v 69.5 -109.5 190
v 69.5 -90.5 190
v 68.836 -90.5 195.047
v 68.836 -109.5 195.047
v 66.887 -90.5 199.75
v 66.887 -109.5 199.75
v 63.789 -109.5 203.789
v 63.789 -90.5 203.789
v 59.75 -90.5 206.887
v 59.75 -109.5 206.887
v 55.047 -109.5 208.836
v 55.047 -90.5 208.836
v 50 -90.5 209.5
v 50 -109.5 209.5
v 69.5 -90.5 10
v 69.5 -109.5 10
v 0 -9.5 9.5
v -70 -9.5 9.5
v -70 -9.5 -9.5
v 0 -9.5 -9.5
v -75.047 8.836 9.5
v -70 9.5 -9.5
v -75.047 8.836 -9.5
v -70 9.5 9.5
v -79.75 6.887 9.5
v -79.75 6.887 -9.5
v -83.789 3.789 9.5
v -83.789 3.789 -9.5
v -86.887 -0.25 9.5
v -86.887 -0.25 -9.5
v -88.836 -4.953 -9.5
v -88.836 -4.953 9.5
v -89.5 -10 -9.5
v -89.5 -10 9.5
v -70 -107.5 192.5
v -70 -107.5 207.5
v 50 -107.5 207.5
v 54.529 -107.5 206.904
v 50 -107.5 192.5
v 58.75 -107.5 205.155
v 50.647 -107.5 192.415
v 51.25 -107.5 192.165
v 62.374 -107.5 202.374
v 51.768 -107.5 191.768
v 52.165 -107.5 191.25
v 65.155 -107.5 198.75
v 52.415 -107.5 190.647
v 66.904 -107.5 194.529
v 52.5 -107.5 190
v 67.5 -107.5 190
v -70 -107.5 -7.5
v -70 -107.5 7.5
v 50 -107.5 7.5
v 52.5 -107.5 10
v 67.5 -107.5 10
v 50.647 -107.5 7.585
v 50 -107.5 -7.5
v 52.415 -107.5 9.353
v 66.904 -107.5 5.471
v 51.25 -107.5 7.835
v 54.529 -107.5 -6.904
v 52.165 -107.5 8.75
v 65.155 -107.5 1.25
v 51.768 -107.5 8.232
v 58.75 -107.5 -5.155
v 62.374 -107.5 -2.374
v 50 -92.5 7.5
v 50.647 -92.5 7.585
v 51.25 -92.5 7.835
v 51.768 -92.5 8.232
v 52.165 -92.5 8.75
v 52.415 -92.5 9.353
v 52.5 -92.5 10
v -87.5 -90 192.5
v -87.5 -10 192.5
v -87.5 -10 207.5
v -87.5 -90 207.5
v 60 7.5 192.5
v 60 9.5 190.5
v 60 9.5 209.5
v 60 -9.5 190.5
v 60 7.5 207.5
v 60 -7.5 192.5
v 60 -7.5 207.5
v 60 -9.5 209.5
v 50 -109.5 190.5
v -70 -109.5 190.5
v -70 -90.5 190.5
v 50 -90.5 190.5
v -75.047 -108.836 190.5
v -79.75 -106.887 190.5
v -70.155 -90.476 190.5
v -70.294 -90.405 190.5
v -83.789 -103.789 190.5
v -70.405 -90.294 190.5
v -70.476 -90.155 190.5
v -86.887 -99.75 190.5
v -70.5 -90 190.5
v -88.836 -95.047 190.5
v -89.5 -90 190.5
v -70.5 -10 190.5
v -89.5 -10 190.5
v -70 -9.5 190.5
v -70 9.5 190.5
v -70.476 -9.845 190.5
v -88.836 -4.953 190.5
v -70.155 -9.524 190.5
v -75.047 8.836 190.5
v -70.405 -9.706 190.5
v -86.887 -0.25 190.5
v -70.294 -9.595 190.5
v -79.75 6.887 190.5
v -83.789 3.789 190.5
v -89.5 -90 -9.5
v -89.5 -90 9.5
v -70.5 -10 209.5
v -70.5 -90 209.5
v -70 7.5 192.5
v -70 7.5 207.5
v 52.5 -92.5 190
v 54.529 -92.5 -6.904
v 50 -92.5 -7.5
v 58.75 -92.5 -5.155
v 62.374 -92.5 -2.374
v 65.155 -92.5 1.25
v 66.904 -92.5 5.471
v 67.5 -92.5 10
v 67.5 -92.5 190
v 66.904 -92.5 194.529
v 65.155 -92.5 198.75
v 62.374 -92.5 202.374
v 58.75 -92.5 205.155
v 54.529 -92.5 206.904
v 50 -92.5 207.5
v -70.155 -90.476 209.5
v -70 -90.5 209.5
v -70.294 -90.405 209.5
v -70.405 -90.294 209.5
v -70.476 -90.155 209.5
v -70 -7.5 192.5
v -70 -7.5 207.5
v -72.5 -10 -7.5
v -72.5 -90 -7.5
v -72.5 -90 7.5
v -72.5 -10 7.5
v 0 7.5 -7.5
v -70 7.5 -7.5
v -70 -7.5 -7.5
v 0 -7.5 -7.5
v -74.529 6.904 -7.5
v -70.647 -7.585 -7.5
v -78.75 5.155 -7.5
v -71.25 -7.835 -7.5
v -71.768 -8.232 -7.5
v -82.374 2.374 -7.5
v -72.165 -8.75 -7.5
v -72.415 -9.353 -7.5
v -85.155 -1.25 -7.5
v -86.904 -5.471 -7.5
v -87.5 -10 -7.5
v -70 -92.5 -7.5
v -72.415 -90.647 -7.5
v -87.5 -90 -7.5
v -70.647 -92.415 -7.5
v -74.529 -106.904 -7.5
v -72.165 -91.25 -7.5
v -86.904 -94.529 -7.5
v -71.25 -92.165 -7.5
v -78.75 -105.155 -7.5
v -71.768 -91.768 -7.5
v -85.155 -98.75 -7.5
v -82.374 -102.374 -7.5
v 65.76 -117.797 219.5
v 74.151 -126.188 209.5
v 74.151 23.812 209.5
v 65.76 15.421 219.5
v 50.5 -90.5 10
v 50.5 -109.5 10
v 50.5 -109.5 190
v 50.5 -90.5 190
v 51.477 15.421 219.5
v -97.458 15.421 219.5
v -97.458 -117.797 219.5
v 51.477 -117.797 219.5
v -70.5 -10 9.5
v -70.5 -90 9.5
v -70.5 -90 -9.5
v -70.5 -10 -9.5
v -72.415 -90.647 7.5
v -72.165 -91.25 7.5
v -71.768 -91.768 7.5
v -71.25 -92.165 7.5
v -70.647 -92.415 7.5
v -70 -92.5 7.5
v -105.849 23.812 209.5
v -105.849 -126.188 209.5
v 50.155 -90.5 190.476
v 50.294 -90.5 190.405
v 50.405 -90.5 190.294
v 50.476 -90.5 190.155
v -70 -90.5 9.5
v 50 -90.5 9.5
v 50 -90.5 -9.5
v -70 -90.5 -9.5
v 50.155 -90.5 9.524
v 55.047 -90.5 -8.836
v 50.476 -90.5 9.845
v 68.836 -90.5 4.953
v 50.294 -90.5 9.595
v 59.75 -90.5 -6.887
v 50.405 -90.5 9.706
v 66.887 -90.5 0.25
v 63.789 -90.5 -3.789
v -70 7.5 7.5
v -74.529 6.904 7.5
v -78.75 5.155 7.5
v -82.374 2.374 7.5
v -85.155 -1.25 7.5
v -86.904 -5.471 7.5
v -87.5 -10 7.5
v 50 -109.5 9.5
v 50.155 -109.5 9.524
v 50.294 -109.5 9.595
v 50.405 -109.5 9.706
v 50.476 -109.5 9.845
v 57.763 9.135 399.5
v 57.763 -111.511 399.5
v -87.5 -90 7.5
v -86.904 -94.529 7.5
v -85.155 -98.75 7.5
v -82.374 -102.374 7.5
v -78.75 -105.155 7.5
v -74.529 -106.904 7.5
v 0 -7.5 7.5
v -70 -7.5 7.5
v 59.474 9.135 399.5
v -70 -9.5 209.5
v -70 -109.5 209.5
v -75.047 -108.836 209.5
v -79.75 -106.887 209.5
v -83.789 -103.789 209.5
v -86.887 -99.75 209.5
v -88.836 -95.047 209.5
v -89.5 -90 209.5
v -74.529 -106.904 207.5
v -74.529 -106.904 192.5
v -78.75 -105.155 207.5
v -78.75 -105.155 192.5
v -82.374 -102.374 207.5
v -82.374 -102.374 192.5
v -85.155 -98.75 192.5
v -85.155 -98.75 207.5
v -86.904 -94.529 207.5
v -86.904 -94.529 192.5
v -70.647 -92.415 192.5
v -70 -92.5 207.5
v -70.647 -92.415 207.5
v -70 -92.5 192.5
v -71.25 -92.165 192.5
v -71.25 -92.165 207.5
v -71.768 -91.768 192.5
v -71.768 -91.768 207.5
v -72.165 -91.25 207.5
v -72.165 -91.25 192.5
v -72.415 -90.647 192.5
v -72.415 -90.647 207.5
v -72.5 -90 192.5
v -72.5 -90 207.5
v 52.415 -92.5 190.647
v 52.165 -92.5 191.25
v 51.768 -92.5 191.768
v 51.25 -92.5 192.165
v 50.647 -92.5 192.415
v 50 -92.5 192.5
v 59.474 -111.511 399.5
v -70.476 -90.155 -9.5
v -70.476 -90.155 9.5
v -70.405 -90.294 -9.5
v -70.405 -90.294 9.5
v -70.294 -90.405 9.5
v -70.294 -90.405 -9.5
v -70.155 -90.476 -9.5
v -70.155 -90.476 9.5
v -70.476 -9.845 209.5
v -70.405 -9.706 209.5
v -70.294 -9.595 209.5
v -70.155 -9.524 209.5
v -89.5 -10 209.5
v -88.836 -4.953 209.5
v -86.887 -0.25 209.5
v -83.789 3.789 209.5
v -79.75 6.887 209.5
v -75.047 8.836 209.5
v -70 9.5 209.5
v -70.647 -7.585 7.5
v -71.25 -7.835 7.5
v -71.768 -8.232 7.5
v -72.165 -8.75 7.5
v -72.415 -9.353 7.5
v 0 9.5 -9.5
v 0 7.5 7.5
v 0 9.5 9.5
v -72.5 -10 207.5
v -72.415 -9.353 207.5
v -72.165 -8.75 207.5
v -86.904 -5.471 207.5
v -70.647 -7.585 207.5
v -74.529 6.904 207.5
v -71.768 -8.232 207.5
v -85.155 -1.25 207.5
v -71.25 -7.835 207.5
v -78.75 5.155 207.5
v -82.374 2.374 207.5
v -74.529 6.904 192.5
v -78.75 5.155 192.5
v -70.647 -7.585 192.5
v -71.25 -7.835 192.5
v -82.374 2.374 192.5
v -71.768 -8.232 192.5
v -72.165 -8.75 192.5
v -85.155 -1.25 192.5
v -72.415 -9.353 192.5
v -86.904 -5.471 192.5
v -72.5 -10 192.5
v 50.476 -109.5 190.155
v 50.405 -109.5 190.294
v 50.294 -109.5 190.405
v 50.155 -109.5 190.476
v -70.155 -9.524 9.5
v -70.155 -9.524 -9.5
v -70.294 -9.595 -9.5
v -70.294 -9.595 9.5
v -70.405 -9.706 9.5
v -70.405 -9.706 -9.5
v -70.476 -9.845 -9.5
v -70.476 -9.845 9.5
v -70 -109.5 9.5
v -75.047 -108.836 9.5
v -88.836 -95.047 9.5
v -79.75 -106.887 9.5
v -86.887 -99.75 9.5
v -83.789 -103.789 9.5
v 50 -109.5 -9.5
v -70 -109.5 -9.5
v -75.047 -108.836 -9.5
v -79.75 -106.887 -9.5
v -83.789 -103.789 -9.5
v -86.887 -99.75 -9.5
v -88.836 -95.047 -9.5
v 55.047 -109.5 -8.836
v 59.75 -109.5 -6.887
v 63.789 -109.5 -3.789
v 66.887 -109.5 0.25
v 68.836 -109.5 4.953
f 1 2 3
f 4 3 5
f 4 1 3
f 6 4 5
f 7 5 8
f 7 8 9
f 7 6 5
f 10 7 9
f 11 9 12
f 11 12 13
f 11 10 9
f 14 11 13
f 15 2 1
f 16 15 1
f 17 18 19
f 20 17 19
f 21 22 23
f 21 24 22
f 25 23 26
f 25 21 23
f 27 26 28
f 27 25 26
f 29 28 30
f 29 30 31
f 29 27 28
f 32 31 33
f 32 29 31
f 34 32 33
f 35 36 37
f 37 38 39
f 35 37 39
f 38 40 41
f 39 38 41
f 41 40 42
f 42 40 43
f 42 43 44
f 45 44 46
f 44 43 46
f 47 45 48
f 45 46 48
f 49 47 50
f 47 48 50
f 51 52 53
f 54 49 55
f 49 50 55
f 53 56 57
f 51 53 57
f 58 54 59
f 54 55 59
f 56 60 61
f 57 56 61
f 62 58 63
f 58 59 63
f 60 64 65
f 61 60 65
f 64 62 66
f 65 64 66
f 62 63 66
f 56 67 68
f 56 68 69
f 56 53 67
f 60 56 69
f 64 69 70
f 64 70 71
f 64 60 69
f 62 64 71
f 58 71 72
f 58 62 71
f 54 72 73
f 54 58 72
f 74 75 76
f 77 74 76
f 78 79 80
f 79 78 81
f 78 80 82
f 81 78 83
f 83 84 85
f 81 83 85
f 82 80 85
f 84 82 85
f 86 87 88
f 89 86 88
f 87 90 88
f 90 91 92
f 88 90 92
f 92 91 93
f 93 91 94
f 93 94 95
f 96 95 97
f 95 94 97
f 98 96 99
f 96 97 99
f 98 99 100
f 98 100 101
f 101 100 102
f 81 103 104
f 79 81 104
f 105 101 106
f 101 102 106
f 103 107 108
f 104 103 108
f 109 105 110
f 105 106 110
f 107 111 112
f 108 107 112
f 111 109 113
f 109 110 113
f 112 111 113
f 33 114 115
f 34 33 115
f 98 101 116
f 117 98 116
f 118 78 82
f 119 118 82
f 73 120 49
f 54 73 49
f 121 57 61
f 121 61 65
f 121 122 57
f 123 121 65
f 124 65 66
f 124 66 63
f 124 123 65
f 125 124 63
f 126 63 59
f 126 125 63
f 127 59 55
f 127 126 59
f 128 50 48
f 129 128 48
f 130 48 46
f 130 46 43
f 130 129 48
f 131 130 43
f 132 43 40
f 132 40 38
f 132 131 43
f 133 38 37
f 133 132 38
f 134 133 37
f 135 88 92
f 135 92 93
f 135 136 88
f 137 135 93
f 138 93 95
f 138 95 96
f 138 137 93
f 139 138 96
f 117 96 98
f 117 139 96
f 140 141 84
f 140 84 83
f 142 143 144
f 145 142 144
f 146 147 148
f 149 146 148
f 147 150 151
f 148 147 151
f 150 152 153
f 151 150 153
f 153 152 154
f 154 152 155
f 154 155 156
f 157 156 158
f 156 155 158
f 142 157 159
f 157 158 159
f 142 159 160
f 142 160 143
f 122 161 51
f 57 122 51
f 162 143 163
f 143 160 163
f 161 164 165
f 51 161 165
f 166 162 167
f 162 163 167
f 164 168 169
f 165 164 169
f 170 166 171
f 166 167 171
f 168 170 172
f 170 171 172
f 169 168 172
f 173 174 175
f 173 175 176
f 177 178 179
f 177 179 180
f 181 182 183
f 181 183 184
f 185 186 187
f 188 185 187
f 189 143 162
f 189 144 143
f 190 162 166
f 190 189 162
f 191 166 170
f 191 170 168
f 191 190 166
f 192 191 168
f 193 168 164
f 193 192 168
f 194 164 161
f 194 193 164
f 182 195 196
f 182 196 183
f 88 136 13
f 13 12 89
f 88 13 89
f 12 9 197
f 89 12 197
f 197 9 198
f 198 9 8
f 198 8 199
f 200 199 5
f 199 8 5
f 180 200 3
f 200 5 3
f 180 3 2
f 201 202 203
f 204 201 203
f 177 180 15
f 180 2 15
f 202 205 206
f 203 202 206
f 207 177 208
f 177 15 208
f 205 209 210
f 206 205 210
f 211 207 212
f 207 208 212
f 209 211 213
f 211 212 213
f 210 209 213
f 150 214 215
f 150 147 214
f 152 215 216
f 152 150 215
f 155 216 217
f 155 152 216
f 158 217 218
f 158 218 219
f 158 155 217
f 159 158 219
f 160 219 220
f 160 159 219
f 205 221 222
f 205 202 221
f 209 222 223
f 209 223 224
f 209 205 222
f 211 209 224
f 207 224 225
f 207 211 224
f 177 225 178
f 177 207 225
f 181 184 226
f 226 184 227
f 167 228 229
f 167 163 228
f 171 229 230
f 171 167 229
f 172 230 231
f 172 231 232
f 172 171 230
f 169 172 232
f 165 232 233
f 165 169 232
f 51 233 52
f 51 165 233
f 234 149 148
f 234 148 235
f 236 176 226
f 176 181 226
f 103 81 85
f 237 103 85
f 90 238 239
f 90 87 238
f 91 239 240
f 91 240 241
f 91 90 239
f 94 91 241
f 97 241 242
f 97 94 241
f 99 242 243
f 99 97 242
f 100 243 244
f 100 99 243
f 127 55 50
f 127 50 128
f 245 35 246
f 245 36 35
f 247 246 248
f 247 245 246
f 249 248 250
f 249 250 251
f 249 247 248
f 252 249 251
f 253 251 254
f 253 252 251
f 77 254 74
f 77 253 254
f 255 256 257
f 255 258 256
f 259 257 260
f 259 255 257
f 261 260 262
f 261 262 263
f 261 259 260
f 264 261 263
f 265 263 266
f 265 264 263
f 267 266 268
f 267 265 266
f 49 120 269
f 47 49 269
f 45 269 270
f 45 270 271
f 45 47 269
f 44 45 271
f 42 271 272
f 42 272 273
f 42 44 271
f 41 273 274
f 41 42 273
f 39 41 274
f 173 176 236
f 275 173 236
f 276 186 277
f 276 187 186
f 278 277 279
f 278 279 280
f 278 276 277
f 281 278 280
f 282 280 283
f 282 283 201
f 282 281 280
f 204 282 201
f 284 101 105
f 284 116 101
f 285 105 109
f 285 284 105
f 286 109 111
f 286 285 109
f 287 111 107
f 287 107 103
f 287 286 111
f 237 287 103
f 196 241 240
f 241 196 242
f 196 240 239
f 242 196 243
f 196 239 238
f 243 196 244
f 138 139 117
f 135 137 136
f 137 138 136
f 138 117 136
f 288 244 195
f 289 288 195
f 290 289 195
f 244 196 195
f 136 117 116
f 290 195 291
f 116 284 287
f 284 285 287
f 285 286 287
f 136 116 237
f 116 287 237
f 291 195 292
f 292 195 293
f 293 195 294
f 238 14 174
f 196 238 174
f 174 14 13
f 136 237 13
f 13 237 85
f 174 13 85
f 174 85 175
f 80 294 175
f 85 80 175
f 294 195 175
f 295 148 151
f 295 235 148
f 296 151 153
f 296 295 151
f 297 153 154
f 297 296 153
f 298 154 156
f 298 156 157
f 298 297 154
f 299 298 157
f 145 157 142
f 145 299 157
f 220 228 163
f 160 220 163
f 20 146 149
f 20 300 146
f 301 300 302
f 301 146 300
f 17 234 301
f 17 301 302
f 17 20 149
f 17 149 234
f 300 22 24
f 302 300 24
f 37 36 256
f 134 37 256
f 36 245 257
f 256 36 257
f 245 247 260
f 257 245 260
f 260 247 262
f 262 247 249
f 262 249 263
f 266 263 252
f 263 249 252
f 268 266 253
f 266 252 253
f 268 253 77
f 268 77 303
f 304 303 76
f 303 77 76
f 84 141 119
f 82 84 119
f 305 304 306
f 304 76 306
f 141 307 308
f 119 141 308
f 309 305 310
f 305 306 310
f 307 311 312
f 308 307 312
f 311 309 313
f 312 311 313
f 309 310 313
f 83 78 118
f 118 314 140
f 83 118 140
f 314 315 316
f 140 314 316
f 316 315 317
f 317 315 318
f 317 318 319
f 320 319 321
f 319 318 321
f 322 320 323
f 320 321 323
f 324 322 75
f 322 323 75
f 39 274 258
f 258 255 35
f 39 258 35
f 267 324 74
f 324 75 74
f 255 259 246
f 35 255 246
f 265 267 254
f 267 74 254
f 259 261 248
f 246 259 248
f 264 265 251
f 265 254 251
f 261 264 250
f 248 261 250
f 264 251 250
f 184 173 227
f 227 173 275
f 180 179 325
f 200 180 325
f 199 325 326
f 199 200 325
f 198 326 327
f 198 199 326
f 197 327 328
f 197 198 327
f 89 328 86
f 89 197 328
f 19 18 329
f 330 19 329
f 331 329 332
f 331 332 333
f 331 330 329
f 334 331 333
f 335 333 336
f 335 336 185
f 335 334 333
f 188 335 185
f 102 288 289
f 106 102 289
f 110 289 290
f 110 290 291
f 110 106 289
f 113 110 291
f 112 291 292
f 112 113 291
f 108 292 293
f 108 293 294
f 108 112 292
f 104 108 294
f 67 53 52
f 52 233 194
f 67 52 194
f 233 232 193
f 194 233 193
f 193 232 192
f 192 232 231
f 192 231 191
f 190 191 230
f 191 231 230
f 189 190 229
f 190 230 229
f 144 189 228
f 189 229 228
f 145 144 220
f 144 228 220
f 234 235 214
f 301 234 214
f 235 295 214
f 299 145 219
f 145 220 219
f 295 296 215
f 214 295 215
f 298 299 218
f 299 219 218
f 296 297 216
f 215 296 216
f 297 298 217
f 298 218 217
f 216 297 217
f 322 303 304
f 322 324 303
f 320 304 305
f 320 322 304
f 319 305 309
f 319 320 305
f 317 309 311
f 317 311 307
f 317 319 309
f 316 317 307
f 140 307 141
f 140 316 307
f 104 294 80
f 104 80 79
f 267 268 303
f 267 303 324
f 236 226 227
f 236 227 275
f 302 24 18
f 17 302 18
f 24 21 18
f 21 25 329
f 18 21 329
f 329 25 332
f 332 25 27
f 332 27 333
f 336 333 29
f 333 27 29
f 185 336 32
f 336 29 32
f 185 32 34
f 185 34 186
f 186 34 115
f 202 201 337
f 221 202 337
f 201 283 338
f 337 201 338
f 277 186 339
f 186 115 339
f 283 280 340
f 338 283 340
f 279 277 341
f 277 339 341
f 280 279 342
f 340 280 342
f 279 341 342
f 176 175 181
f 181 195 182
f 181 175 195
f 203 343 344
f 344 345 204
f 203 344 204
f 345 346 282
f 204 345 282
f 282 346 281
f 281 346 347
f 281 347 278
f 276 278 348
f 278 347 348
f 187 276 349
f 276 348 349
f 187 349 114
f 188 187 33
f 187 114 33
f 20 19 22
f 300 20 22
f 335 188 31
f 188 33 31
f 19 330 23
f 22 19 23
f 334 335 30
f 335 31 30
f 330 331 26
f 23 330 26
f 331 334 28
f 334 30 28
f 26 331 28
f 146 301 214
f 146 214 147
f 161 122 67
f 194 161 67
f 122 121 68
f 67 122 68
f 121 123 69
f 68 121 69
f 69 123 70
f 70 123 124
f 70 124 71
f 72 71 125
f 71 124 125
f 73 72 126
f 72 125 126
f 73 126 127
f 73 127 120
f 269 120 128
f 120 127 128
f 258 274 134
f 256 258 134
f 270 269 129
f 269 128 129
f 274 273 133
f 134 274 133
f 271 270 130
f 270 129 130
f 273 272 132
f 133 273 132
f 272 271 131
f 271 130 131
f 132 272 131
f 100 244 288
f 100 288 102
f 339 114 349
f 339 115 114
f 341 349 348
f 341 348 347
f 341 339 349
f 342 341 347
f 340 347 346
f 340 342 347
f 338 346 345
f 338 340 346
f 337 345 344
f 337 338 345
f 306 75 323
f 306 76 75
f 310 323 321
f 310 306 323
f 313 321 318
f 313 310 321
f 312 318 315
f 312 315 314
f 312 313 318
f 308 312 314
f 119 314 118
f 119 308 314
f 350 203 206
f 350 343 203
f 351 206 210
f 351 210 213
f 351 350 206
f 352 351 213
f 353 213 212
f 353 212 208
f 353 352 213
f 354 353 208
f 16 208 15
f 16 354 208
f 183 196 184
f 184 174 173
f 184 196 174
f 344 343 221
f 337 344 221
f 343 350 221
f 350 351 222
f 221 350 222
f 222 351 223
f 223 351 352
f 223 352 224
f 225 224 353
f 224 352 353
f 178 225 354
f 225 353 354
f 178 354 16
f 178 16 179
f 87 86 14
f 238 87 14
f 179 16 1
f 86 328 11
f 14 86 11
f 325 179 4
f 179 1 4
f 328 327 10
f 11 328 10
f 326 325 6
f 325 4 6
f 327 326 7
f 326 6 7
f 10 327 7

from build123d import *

# Parameters (mm, degrees)
SKETCH2_W           = 19
SKETCH2_H           = 19
SKETCH2_W_2         = 15
SKETCH2_H_2         = 15
SKETCH3_W           = 180
SKETCH3_H           = 150
BOSS_EXTRUDE1_DEPTH = 10
BOSS_EXTRUDE1_TAPER = 40
SKETCH4_W           = 14.282717188
SKETCH4_H           = 133.218007376
BOSS_EXTRUDE2_DEPTH = 180
BOSS_EXTRUDE2_TAPER = 2


with BuildPart() as part:
    # Sweep-Thin1: sweep along a curve in space
    with BuildLine() as sweep_thin1_path:
        Line((0, 0, 0), (-70, 0, 0))
        ThreePointArc((-70, 0, 0), (-77.071067812, -2.928932188, 0), (-80, -10, 0))
        Line((-80, -10, 0), (-80, -90, 0))
        ThreePointArc((-80, -90, 0), (-77.071067812, -97.071067812, 0), (-70, -100, 0))
        Line((-70, -100, 0), (50, -100, 0))
        ThreePointArc((50, -100, 0), (57.071067812, -100, 2.928932188), (60, -100, 10))
        Line((60, -100, 10), (60, -100, 190))
        ThreePointArc((60, -100, 190), (57.071067812, -100, 197.071067812), (50, -100, 200))
        Line((50, -100, 200), (-70, -100, 200))
        ThreePointArc((-70, -100, 200), (-77.071067812, -97.071067812, 200), (-80, -90, 200))
        Line((-80, -90, 200), (-80, -10, 200))
        ThreePointArc((-80, -10, 200), (-77.071067812, -2.928932188, 200), (-70, 0, 200))
        Line((-70, 0, 200), (60, 0, 200))
    # Sketch2 → Sweep-Thin1 (sweep)
    with BuildSketch(Plane(origin=(0, 0, 0), x_dir=(0, 0, -1), z_dir=(1, 0, 0))):
        Rectangle(SKETCH2_W, SKETCH2_H)
        Rectangle(SKETCH2_W_2, SKETCH2_H_2, mode=Mode.SUBTRACT)
    sweep(path=sweep_thin1_path.line)

    # Sketch3 → Boss-Extrude1 (add)
    with BuildSketch(Plane.XY.offset(209.5)):
        with Locations((-15.849049542, -51.188068464)):
            Rectangle(SKETCH3_W, SKETCH3_H)
    extrude(amount=BOSS_EXTRUDE1_DEPTH, taper=BOSS_EXTRUDE1_TAPER)

    # Sketch4 → Boss-Extrude2 (add)
    with BuildSketch(Plane.XY.offset(219.5)):
        with Locations((58.618595553, -51.188068464)):
            Rectangle(SKETCH4_W, SKETCH4_H)
    extrude(amount=BOSS_EXTRUDE2_DEPTH, taper=BOSS_EXTRUDE2_TAPER)


solid = part.part
